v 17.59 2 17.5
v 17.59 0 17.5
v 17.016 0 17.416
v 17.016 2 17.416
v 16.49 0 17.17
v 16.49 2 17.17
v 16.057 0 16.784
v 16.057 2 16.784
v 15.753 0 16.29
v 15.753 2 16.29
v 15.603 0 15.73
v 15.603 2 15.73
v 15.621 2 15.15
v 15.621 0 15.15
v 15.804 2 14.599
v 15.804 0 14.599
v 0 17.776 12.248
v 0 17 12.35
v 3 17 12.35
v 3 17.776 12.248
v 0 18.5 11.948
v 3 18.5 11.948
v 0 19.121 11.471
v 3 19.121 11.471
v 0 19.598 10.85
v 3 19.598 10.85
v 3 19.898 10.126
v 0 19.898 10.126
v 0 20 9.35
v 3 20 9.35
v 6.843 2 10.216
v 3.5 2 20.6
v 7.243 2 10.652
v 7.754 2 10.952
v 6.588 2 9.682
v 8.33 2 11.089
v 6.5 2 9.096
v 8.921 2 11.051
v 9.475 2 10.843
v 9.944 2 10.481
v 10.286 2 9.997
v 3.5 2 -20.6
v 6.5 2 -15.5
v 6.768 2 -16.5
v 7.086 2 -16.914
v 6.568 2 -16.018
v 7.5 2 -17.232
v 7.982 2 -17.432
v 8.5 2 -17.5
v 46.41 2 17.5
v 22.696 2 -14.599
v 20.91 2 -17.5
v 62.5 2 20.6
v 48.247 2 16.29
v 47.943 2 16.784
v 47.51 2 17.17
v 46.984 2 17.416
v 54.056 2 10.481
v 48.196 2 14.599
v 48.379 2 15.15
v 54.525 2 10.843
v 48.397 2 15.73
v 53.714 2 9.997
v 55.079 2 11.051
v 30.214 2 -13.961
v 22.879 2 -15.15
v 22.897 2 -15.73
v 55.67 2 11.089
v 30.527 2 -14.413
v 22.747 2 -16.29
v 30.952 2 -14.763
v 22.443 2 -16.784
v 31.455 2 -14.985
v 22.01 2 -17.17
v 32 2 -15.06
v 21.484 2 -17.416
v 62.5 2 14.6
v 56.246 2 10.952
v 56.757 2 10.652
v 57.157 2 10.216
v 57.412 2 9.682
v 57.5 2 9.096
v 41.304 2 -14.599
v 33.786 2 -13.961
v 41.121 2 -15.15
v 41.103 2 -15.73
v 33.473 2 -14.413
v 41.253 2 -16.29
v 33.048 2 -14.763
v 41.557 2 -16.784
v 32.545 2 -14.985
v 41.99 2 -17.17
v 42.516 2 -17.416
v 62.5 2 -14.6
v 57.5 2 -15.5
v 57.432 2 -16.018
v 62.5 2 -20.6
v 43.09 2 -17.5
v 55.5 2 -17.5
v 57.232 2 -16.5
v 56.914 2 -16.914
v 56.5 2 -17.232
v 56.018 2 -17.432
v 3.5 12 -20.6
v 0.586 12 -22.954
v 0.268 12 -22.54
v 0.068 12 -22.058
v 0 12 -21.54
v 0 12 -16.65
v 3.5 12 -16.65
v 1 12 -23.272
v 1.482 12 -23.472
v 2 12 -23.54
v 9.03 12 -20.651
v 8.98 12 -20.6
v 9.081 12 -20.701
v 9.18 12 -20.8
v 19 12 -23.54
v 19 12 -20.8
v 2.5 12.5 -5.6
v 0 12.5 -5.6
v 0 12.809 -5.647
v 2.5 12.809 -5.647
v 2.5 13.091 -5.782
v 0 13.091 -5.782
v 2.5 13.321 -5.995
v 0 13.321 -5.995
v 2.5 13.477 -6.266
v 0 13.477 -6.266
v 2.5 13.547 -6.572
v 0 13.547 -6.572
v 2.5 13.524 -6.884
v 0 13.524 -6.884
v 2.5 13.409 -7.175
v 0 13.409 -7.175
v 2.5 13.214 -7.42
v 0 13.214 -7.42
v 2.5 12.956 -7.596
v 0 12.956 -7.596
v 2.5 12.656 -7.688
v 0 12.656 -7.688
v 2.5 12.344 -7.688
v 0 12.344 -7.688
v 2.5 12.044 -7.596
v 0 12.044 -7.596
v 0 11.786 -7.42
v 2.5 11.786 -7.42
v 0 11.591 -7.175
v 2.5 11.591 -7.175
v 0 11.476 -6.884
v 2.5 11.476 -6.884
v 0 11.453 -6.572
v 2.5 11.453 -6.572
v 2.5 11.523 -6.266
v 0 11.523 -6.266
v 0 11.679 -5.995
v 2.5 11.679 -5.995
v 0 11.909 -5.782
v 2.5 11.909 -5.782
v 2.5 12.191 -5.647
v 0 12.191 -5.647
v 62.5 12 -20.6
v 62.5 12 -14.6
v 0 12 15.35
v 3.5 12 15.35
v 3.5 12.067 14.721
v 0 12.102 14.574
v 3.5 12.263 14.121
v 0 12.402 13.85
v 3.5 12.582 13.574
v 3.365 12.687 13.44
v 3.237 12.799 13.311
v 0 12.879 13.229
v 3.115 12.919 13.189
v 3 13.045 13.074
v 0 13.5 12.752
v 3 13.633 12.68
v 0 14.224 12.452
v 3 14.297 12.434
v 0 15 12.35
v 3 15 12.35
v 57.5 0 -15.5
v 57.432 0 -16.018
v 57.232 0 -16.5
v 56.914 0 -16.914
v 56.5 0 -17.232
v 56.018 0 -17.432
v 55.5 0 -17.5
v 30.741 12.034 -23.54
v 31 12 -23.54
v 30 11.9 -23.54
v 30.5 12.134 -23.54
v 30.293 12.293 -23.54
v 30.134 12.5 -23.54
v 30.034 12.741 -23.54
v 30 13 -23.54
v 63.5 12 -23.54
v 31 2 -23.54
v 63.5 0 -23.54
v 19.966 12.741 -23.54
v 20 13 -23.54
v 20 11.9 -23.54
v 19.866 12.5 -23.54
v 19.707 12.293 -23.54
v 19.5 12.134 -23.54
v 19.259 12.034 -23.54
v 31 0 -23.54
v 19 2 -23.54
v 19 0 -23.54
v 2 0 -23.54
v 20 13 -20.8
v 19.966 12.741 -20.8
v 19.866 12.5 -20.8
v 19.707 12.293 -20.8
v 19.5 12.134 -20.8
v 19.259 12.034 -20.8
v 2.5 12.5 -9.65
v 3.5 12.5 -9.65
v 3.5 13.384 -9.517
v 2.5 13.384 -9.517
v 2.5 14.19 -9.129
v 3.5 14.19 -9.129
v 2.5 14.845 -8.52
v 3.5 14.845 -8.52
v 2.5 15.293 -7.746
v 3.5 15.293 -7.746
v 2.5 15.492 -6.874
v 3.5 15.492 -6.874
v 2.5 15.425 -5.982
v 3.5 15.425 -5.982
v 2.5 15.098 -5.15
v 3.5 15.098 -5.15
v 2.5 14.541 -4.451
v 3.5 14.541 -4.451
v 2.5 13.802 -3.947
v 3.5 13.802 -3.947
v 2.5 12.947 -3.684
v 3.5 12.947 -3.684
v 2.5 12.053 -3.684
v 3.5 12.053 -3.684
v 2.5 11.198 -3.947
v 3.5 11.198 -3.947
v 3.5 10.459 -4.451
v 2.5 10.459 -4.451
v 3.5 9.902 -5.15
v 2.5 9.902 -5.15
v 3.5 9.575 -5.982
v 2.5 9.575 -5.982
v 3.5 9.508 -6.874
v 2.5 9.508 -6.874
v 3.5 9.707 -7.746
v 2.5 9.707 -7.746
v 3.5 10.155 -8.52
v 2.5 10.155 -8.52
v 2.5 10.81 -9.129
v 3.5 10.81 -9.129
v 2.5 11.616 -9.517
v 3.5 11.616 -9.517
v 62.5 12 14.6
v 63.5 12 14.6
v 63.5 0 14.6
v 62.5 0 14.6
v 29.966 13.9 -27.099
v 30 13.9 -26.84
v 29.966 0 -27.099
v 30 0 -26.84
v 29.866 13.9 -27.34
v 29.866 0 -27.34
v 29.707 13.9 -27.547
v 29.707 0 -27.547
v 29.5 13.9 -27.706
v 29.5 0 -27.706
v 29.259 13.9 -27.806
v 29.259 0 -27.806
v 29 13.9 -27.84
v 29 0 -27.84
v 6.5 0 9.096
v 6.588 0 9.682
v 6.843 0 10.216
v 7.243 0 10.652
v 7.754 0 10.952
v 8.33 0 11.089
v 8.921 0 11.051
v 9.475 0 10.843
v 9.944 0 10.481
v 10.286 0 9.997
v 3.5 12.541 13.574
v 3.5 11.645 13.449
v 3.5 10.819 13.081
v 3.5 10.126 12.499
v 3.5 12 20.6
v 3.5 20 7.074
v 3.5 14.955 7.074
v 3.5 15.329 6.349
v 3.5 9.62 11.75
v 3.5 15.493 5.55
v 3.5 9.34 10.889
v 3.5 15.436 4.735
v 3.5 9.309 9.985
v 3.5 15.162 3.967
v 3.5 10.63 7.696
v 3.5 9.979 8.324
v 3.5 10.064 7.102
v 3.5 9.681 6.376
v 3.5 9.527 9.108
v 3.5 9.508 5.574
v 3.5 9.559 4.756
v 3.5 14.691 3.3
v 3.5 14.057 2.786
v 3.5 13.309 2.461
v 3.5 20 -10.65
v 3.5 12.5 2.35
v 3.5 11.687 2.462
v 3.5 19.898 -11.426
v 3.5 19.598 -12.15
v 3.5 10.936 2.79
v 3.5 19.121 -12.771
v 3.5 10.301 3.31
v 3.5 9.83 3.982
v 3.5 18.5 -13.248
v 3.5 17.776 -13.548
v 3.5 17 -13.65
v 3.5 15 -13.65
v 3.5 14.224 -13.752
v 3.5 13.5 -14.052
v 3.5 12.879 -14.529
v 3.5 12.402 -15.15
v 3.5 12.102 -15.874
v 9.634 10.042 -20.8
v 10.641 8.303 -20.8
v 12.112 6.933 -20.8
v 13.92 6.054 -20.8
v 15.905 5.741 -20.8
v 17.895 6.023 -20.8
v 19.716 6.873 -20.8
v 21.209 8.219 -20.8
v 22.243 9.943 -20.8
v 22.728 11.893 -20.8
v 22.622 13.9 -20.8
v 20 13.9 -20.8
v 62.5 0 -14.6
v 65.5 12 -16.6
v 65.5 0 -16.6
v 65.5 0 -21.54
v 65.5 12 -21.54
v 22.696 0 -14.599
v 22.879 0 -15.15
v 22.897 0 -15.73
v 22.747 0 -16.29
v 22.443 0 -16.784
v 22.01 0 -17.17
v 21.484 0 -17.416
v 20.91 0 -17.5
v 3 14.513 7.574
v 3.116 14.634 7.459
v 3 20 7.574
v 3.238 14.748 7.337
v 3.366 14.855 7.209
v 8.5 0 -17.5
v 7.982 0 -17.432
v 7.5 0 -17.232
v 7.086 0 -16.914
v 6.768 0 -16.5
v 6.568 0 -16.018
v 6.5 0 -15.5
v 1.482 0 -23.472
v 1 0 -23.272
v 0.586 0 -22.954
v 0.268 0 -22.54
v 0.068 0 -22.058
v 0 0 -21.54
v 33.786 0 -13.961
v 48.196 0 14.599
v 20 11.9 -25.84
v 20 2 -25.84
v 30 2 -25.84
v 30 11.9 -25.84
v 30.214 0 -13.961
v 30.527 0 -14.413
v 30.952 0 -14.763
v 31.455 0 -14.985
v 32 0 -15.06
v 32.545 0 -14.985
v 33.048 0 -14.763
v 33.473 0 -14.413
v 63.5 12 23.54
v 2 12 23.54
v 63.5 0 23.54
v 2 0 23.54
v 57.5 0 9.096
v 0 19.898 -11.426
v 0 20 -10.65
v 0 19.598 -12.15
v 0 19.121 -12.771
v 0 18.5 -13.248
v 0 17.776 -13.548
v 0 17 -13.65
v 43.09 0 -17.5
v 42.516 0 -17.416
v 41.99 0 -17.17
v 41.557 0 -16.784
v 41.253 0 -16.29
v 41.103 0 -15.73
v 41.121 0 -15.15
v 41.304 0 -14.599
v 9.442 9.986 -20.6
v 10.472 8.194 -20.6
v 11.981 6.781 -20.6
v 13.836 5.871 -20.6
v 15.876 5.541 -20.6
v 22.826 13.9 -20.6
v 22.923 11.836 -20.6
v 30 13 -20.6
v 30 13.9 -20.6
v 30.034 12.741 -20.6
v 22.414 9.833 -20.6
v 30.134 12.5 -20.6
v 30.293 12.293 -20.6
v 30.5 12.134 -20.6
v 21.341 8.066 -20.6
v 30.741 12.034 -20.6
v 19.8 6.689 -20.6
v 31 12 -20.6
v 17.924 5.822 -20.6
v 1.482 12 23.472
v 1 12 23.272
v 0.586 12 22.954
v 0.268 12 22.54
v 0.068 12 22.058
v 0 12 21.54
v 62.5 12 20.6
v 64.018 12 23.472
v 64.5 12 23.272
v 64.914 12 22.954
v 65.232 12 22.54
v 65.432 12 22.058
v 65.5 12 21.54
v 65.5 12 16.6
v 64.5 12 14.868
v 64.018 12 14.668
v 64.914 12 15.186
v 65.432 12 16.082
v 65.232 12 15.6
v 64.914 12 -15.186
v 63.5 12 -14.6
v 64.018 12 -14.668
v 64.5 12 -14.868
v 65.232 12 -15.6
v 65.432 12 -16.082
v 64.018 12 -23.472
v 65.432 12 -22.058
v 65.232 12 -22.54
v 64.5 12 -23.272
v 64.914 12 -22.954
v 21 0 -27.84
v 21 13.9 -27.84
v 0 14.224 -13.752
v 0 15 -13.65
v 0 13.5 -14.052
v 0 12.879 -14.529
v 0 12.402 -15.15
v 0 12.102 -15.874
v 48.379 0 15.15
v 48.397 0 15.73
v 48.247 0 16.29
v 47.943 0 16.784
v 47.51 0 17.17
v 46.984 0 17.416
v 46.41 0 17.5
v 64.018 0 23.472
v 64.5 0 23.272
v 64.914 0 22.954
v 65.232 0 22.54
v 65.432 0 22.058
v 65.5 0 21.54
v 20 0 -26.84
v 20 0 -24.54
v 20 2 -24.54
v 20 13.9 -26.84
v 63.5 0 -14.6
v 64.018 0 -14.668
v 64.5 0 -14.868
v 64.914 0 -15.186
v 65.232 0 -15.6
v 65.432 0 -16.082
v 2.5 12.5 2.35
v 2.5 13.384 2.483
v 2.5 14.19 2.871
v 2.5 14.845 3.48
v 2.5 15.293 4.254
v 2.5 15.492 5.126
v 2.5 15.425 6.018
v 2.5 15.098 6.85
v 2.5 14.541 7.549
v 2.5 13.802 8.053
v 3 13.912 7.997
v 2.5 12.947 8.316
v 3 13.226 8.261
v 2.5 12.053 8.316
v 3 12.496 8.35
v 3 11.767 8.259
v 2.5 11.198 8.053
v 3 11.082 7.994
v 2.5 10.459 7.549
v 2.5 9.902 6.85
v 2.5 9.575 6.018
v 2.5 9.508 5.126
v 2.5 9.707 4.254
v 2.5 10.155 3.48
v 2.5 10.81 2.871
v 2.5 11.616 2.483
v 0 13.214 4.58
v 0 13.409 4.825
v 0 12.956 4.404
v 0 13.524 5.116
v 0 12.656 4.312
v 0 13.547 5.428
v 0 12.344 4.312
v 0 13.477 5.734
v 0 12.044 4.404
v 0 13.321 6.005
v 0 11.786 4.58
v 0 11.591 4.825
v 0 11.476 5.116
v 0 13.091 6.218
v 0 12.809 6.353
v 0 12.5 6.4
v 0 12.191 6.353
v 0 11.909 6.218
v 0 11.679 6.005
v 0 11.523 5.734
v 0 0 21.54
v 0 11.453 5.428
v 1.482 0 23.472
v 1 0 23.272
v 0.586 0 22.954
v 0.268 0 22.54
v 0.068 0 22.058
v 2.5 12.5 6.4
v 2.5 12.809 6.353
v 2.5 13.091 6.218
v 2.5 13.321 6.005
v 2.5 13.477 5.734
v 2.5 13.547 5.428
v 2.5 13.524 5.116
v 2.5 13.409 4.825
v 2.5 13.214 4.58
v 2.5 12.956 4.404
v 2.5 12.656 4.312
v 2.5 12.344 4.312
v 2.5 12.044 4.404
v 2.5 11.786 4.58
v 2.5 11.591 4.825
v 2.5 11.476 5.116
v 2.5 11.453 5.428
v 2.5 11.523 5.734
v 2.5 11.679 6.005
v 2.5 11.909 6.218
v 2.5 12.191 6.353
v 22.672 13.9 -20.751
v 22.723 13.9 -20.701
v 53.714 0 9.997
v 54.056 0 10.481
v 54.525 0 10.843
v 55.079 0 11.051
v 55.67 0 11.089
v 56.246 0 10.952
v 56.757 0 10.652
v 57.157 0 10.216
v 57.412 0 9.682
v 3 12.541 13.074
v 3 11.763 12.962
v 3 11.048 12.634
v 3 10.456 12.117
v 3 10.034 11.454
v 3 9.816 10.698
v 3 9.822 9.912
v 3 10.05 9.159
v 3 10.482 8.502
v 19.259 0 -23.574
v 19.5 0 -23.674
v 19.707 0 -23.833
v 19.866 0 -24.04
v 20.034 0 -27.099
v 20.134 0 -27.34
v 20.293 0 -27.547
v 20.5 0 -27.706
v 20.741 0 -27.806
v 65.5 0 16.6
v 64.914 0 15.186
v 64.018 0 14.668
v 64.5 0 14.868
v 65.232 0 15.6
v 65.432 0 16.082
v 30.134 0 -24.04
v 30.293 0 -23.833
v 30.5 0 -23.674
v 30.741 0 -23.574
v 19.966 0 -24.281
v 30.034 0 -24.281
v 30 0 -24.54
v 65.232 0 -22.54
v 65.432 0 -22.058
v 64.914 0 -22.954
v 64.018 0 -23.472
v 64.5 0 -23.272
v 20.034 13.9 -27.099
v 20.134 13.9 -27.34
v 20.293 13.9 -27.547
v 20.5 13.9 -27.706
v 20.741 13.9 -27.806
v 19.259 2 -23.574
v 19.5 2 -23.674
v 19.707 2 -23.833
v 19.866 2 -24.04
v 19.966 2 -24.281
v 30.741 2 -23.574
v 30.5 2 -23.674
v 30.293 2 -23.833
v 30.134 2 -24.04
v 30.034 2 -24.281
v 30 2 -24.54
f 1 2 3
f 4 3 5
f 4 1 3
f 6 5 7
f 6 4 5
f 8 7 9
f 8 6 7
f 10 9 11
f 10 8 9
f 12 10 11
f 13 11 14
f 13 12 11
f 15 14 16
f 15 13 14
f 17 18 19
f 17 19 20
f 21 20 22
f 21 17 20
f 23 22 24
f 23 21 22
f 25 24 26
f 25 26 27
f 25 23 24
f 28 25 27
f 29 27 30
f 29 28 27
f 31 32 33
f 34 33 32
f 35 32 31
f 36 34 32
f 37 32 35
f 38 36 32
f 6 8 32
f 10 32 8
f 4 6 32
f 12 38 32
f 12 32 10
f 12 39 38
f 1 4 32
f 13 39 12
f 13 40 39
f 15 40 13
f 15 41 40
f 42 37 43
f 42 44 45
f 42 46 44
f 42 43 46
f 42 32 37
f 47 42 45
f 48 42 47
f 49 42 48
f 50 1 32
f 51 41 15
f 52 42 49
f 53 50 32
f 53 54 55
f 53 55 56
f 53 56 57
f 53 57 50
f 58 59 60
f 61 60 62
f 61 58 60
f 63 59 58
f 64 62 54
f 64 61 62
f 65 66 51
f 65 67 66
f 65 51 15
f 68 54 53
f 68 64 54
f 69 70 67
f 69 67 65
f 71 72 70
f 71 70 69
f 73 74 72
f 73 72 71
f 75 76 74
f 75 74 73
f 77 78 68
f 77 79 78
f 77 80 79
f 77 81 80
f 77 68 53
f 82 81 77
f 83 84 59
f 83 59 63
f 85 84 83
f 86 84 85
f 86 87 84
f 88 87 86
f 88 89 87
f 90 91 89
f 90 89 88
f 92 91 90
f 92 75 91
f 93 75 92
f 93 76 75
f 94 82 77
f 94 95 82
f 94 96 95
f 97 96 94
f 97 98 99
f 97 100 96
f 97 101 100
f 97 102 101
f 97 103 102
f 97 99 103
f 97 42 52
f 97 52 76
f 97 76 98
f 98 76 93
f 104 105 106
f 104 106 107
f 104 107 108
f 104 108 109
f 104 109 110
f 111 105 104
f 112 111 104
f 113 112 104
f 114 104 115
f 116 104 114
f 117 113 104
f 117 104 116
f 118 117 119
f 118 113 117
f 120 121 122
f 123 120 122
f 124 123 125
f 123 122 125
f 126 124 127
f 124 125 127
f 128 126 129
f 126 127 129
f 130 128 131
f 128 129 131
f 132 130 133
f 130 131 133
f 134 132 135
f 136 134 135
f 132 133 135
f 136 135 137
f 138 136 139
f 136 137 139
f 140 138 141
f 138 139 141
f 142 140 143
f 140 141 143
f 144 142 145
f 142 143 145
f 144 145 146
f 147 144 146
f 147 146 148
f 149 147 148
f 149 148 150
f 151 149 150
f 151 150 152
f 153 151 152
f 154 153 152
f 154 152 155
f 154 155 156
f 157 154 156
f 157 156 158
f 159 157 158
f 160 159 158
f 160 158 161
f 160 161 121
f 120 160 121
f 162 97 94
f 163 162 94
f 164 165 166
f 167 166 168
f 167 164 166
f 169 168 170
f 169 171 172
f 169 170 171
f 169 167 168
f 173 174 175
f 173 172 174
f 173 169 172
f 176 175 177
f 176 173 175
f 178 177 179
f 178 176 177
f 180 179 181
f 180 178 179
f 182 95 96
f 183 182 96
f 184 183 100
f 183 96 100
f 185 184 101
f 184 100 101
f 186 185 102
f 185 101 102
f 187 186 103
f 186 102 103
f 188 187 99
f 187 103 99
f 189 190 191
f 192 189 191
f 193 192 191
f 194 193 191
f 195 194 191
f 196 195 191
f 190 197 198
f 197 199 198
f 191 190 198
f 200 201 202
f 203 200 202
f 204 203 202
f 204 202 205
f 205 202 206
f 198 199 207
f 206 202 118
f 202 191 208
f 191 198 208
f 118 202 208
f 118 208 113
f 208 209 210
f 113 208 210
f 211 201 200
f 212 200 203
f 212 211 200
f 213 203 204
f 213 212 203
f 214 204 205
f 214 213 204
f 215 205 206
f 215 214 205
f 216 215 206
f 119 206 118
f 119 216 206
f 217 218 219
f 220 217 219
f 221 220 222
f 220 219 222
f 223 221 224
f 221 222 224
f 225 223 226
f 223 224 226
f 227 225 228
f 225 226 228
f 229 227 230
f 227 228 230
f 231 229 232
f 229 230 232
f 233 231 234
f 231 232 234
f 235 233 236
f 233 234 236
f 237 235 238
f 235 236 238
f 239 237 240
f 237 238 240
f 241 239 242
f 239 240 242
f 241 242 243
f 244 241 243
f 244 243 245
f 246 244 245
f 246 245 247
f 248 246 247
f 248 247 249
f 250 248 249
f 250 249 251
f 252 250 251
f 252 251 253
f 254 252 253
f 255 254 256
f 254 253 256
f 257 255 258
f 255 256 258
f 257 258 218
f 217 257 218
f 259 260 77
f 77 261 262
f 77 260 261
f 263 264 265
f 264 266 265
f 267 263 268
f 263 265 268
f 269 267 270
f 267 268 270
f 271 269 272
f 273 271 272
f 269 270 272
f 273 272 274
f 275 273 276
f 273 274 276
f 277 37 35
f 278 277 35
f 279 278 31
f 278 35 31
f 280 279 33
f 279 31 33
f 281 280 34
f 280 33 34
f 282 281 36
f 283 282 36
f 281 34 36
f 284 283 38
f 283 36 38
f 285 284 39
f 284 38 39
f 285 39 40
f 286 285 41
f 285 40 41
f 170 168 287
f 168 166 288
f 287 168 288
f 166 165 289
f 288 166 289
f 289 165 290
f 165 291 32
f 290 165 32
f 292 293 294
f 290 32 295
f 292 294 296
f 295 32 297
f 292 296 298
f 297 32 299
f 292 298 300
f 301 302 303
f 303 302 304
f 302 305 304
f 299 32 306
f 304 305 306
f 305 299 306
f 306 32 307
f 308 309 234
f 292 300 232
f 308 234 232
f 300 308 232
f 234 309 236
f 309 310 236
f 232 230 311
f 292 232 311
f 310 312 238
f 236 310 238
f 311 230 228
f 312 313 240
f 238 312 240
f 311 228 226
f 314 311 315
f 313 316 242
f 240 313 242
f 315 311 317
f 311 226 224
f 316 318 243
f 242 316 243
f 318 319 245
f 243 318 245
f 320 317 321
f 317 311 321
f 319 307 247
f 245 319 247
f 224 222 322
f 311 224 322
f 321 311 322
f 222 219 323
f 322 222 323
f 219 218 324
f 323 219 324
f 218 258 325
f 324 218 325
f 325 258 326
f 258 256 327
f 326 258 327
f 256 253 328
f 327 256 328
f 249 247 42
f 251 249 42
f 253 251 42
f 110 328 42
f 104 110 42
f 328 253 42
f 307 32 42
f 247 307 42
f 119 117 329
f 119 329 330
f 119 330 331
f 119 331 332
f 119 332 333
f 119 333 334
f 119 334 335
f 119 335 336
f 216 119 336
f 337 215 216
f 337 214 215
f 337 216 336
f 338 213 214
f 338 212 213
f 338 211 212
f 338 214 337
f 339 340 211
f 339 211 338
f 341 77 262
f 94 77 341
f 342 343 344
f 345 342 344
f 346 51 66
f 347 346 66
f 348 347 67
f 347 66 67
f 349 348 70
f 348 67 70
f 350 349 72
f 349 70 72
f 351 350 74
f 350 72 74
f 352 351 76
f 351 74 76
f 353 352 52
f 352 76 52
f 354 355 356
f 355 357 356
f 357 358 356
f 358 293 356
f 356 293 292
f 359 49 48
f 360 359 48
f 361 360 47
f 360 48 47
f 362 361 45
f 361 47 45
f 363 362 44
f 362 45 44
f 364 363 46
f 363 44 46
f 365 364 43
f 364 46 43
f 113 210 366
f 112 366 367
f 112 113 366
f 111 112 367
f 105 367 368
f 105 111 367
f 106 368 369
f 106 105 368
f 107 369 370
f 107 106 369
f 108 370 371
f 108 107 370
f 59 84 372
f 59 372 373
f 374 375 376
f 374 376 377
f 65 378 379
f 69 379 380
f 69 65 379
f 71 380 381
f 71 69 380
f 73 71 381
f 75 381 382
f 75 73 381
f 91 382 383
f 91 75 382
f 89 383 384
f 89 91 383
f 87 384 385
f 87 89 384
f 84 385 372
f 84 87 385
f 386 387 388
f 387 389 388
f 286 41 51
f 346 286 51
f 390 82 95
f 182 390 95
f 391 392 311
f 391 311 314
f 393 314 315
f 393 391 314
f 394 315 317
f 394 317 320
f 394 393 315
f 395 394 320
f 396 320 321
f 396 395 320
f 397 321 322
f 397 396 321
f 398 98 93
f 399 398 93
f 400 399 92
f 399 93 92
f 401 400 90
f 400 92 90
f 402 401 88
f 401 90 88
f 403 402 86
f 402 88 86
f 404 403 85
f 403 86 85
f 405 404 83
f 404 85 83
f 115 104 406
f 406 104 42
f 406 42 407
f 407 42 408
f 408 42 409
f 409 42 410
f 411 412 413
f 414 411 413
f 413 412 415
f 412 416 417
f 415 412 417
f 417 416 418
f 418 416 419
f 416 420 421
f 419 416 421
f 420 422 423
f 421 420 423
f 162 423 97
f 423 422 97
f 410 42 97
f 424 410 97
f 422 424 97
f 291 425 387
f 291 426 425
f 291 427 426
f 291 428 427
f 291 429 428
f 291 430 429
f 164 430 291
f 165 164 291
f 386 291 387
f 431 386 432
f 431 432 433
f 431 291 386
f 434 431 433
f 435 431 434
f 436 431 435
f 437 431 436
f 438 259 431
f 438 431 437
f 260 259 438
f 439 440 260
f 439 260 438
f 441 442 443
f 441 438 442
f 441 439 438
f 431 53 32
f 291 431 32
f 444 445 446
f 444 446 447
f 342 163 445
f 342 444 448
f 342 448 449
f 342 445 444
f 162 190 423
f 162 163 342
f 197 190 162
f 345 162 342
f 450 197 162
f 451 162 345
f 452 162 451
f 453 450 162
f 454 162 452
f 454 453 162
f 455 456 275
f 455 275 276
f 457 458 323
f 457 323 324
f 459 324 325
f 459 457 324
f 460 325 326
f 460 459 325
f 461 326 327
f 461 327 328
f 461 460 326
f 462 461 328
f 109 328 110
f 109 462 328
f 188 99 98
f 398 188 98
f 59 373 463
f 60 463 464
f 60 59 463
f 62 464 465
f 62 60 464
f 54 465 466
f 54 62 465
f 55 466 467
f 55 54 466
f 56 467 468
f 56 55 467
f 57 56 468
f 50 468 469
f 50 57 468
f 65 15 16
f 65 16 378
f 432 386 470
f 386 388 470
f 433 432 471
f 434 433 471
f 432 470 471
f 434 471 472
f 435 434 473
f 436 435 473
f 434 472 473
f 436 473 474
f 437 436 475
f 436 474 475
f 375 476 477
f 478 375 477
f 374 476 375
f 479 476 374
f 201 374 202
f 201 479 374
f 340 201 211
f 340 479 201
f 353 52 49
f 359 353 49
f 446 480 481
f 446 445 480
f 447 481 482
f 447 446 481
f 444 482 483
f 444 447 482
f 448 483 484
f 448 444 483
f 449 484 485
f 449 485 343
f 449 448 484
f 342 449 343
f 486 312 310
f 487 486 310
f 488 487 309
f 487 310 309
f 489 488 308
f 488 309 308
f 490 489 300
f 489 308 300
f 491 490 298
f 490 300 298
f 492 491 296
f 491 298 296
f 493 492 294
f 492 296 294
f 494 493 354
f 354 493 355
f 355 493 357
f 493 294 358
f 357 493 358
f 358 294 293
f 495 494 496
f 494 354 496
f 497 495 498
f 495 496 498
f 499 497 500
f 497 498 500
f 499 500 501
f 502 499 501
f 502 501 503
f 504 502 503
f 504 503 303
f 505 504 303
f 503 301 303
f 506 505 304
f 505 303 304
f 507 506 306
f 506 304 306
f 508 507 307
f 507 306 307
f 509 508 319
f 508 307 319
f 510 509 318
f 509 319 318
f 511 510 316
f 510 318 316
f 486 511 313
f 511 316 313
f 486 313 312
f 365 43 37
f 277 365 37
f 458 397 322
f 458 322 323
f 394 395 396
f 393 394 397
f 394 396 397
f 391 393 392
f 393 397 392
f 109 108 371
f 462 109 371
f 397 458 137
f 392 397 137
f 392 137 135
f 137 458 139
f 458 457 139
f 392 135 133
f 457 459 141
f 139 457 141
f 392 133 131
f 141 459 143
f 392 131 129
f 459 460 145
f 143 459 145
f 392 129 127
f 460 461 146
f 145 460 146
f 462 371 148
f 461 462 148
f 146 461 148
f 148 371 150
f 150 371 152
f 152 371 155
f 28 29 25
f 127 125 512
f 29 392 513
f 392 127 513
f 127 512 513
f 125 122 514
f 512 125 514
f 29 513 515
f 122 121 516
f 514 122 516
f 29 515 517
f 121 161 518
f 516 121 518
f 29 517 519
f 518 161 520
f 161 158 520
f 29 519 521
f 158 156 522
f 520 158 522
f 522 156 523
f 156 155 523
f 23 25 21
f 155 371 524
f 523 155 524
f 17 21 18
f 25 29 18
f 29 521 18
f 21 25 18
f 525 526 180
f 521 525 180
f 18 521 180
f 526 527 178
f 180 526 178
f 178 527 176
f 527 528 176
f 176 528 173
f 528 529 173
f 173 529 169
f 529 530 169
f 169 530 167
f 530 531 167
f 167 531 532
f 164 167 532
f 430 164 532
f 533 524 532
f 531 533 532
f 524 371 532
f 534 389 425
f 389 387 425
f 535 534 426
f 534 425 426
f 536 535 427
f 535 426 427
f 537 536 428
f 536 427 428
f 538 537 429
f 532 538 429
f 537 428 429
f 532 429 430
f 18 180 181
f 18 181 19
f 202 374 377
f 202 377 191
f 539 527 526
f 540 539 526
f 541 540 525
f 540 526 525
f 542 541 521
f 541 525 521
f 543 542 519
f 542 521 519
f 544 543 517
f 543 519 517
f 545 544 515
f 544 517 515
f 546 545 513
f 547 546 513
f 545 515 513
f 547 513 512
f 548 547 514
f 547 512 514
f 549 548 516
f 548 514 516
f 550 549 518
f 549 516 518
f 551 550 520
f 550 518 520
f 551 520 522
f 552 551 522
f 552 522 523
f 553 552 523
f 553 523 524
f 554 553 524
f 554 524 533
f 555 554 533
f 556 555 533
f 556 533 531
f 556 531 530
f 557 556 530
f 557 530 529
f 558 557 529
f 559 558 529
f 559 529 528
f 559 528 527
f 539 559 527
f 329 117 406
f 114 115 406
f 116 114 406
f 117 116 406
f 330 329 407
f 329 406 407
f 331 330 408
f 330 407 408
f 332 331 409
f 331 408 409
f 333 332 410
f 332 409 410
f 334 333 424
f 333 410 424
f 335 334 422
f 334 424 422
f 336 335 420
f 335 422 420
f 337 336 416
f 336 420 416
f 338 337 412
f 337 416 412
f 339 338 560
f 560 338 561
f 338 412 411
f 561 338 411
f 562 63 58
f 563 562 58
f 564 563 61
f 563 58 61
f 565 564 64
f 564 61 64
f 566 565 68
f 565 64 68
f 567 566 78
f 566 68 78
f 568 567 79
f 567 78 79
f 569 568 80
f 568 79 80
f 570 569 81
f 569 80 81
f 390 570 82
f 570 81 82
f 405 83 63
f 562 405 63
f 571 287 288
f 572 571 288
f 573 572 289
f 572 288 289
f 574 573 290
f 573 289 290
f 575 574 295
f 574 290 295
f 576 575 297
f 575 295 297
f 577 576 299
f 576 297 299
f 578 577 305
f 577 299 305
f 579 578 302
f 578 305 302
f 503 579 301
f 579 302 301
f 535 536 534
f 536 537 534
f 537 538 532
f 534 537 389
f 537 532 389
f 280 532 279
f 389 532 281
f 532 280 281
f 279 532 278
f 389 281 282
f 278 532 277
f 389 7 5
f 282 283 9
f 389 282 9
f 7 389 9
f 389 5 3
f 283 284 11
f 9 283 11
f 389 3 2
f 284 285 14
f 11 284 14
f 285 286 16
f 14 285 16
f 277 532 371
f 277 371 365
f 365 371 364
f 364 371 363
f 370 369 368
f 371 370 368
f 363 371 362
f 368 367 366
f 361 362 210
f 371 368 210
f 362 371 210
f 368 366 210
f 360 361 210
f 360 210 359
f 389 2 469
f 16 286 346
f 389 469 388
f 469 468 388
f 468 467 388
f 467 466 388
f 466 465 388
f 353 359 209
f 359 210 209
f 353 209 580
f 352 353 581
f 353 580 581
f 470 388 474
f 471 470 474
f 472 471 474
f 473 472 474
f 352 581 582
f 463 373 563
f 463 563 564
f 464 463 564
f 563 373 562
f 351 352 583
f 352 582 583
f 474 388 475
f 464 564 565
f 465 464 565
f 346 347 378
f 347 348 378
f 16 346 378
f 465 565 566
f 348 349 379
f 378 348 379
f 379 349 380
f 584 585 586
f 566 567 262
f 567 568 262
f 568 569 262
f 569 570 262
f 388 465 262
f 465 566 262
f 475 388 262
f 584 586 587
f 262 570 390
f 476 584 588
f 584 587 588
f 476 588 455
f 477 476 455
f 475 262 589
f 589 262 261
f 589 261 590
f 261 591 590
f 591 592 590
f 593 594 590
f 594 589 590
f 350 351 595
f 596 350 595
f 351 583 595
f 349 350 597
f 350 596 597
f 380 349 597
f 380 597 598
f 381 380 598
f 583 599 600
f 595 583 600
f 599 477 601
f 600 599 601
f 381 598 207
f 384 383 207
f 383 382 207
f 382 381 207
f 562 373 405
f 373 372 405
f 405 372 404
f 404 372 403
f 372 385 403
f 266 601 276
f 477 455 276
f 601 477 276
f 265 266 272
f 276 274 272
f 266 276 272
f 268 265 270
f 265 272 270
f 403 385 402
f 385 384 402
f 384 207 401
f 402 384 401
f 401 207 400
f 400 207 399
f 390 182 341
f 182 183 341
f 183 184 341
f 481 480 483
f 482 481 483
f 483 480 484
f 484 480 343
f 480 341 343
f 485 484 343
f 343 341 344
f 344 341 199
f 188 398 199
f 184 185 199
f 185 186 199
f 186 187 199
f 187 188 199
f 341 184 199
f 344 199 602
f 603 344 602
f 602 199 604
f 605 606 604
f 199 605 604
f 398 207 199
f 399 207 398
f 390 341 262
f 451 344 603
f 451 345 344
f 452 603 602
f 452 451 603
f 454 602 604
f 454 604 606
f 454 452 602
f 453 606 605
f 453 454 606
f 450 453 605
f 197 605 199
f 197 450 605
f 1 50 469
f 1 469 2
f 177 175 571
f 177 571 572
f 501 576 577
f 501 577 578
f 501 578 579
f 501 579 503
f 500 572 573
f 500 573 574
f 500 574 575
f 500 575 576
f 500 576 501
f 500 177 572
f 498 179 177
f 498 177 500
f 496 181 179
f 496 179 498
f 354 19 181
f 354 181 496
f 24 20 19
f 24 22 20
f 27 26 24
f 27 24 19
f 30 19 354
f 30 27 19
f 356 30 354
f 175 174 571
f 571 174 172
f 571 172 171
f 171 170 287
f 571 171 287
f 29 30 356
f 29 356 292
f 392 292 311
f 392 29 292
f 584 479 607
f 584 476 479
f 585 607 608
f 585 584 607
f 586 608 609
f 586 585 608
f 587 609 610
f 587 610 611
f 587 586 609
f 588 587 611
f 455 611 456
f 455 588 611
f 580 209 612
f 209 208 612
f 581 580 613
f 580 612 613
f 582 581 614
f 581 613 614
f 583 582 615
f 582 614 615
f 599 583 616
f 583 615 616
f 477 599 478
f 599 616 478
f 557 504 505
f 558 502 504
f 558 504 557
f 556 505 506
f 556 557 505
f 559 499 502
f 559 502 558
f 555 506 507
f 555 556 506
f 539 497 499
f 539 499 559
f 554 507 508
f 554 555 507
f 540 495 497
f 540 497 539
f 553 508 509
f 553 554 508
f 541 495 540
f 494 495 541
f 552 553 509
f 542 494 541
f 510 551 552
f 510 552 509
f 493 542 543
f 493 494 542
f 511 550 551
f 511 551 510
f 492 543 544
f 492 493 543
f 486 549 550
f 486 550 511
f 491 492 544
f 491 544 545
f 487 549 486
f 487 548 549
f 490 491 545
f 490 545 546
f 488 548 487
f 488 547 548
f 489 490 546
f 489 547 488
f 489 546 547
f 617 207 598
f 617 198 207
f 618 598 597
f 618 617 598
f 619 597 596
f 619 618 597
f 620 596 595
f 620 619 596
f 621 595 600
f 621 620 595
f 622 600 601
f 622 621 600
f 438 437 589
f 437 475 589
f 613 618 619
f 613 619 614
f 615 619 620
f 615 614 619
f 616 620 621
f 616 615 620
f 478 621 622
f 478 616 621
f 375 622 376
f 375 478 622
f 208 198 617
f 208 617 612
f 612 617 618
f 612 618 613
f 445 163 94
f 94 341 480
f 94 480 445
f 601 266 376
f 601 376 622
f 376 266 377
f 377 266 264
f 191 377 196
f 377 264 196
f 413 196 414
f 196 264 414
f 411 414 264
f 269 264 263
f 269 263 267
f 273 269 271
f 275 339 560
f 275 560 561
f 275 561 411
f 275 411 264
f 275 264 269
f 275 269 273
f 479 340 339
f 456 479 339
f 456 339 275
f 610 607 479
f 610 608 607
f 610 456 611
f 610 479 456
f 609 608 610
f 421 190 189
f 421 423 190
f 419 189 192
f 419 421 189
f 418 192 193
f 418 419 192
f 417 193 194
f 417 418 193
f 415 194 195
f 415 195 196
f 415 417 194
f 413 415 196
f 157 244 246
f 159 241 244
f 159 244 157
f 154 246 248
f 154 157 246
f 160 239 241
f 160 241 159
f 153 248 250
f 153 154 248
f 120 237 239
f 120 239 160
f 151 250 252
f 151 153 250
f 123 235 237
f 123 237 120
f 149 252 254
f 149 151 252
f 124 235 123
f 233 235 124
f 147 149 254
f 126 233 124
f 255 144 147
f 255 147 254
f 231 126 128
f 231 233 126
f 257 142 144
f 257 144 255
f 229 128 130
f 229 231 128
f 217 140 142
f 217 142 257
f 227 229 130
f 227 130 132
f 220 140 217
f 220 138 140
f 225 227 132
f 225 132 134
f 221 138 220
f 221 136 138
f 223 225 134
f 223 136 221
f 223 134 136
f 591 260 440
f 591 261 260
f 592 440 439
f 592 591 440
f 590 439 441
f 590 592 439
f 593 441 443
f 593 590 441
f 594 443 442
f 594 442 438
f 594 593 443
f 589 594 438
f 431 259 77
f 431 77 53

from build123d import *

# Parameters (mm, degrees)
SKETCH1_W           = 65.5
SKETCH1_H           = 47.08
BOSS_EXTRUDE1_DEPTH = 2
BOSS_EXTRUDE2_DEPTH = 10
BOSS_EXTRUDE3_DEPTH = 3.5
SKETCH4_R           = 1.05
CUT_EXTRUDE1_DEPTH  = 73.418102709
CUT_EXTRUDE3_DEPTH  = 72.891457072
CUT_EXTRUDE8_DEPTH  = 0.5
CUT_EXTRUDE8_DRAFT  = -45
SKETCH25_W          = 3
SKETCH25_H          = 29.2
CUT_EXTRUDE10_DEPTH = 72.891457072
FILLET1_R           = 2
BOSS_EXTRUDE4_DEPTH = 10
FILLET2_R           = 1
SKETCH27_R          = 3
CUT_EXTRUDE11_DEPTH = 1
FILLET4_R           = 1
SKETCH24_R          = 7
CUT_EXTRUDE9_DEPTH  = 0.2
CUT_EXTRUDE9_DRAFT  = -45


with BuildPart() as part:
    # Sketch1 → Boss-Extrude1 (new body)
    with BuildSketch(Plane(origin=(0, 0, 0), x_dir=(1, 0, 0), z_dir=(0, 1, 0))):
        with Locations((32.75, 0)):
            Rectangle(SKETCH1_W, SKETCH1_H)
    extrude(amount=BOSS_EXTRUDE1_DEPTH)

    # Sketch2 → Boss-Extrude2 (add)
    with BuildSketch(Plane(origin=(0, 2, 0), x_dir=(1, 0, 0), z_dir=(0, 1, 0))):
        Polygon((3.5, 20.6), (62.5, 20.6), (62.5, 14.6), (65.5, 14.6), (65.5, 23.54), (0, 23.54), (0, -23.54), (65.5, -23.54), (65.5, -14.6), (62.5, -14.6), (62.5, -20.6), (3.5, -20.6), align=None)
    extrude(amount=BOSS_EXTRUDE2_DEPTH)

    # Sketch3 → Boss-Extrude3 (add)
    with BuildSketch(Plane.ZY):
        with BuildLine():
            Line((-16.65, 12), (-0.65, 12))
            Line((-0.65, 12), (-0.65, 20))
            Line((-0.65, 20), (-10.65, 20))
            ThreePointArc((-10.65, 20), (-12.771320344, 19.121320344), (-13.65, 17))
            Line((-13.65, 17), (-13.65, 15))
            ThreePointArc((-13.65, 15), (-14.528679656, 12.878679656), (-16.65, 12))
        make_face()
        with BuildLine():
            Line((-0.65, 20), (-0.65, 12))
            Line((-0.65, 12), (15.35, 12))
            ThreePointArc((15.35, 12), (13.228679656, 12.878679656), (12.35, 15))
            Line((12.35, 15), (12.35, 17))
            ThreePointArc((12.35, 17), (11.471320344, 19.121320344), (9.35, 20))
            Line((9.35, 20), (-0.65, 20))
        make_face()
    extrude(amount=-BOSS_EXTRUDE3_DEPTH)

    # Sketch4 → Cut-Extrude1 (cut, through all)
    with BuildSketch(Plane.ZY):
        with Locations((-6.65, 12.5)):
            Circle(SKETCH4_R)
        with Locations((5.35, 12.5)):
            Circle(SKETCH4_R)
    extrude(amount=-CUT_EXTRUDE1_DEPTH, mode=Mode.SUBTRACT)

    # Sketch6 → Cut-Extrude3 (cut, through all)
    with BuildSketch(Plane(origin=(0, 2, 0), x_dir=(1, 0, 0), z_dir=(0, 1, 0))):
        with BuildLine():
            Line((6.5, 15.5), (6.5, -9.096254447))
            ThreePointArc((6.5, -9.096254447), (8.036954343, -11.041913389), (10.285588719, -9.997183371))
            Line((10.285588719, -9.997183371), (22.695768518, 14.599071076))
            ThreePointArc((22.695768518, 14.599071076), (22.613391155, 16.548365908), (20.910179799, 17.5))
            Line((20.910179799, 17.5), (8.5, 17.5))
            ThreePointArc((8.5, 17.5), (7.085786438, 16.914213562), (6.5, 15.5))
        make_face()
        with BuildLine():
            Line((15.804231482, -14.599071076), (30.214411281, 13.961067028))
            ThreePointArc((30.214411281, 13.961067028), (32, 15.060138105), (33.785588719, 13.961067028))
            Line((33.785588719, 13.961067028), (48.195768518, -14.599071076))
            ThreePointArc((48.195768518, -14.599071076), (48.113391155, -16.548365908), (46.410179799, -17.5))
            Line((46.410179799, -17.5), (17.589820201, -17.5))
            ThreePointArc((17.589820201, -17.5), (15.886608845, -16.548365908), (15.804231482, -14.599071076))
        make_face()
        with BuildLine():
            Line((57.5, -9.096254447), (57.5, 15.5))
            ThreePointArc((57.5, 15.5), (56.914213562, 16.914213562), (55.5, 17.5))
            Line((55.5, 17.5), (43.089820201, 17.5))
            ThreePointArc((43.089820201, 17.5), (41.386608845, 16.548365908), (41.304231482, 14.599071076))
            Line((41.304231482, 14.599071076), (53.714411281, -9.997183371))
            ThreePointArc((53.714411281, -9.997183371), (55.963045657, -11.041913389), (57.5, -9.096254447))
        make_face()
    extrude(amount=-CUT_EXTRUDE3_DEPTH, mode=Mode.SUBTRACT)


with BuildPart() as cut_extrude8_tool:
    # Sketch23 → Cut-Extrude8 (with draft: the straight prism first)
    with BuildSketch(Plane(origin=(3.5, 0, 0), x_dir=(0, 0, -1), z_dir=(1, 0, 0))):
        with BuildLine():
            ThreePointArc((-13.5745, 12.541), (-10.3245, 9.291), (-7.0745, 12.541))
            Line((-7.0745, 12.541), (-7.0745, 22.997537045))
            Line((-7.0745, 22.997537045), (-13.5745, 22.997537045))
            Line((-13.5745, 22.997537045), (-13.5745, 12.541))
        make_face()
    extrude(amount=-CUT_EXTRUDE8_DEPTH)
    # Cut-Extrude8: the draft: its side faces are tilted about the plane it starts from
    cut_extrude8_sides = [cut_extrude8_tool.faces().sort_by_distance(p)[0] for p in [
        (3.25, 17.769268522, 7.0745),
        (3.25, 22.997537045, 10.3245),
        (3.25, 17.769268522, 13.5745),
        (3.25, 9.291, 10.3245),
    ]]
    draft(cut_extrude8_sides, Plane(origin=(3.5, 0, 0), x_dir=(0, 0, -1), z_dir=(1, 0, 0)), CUT_EXTRUDE8_DRAFT)


with BuildPart() as part_1:
    add(part.part)

    # Cut-Extrude8: cut by cut_extrude8_tool
    add(cut_extrude8_tool.part, mode=Mode.SUBTRACT)

    # Sketch25 → Cut-Extrude10 (cut, through all)
    with BuildSketch(Plane(origin=(0, 2, 0), x_dir=(1, 0, 0), z_dir=(0, 1, 0))):
        with Locations((64, 0)):
            Rectangle(SKETCH25_W, SKETCH25_H)
    extrude(amount=-CUT_EXTRUDE10_DEPTH, mode=Mode.SUBTRACT)

    # Fillet1
    fillet1_edges = [part_1.edges().sort_by_distance(p)[0] for p in [
        (65.5, 6, 14.6),
        (65.5, 6, -14.6),
        (65.5, 6, -23.54),
        (65.5, 6, 23.54),
        (0, 6, 23.54),
        (0, 6, -23.54),
    ]]
    fillet(fillet1_edges, radius=FILLET1_R)

    # Sketch26 → Boss-Extrude4 (add)
    with BuildSketch(Plane.ZY.offset(-20)):
        Polygon((-27.84, 0), (-23.54, 0), (-23.54, 2), (-25.84, 2), (-25.84, 11.9), (-23.54, 11.9), (-23.54, 12), (-20.6, 12), (-20.6, 13.9), (-27.84, 13.9), (-27.84, 12), align=None)
    extrude(amount=-BOSS_EXTRUDE4_DEPTH)

    # Fillet2
    fillet2_edges = [part_1.edges().sort_by_distance(p)[0] for p in [
        (20, 6.95, -27.84),
        (30, 1, -23.54),
        (30, 6.95, -27.84),
        (20, 1, -23.54),
    ]]
    fillet(fillet2_edges, radius=FILLET2_R)

    # Sketch27 → Cut-Extrude11 (cut)
    with BuildSketch(Plane(origin=(3.5, 0, 0), x_dir=(0, 0, -1), z_dir=(1, 0, 0))):
        with Locations((-5.35, 12.5)):
            Circle(SKETCH27_R)
        with Locations((6.65, 12.5)):
            Circle(SKETCH27_R)
    extrude(amount=-CUT_EXTRUDE11_DEPTH, mode=Mode.SUBTRACT)

    # Fillet4
    fillet4_edges = [part_1.edges().sort_by_distance(p)[0] for p in [
        (20, 12, -22.07),
        (30, 12, -22.07),
    ]]
    fillet(fillet4_edges, radius=FILLET4_R)


with BuildPart() as cut_extrude9_tool:
    # Sketch24 → Cut-Extrude9 (with draft: the straight prism first)
    with BuildSketch(Plane.XY.offset(-20.6)):
        with Locations((15.9587, 12.541)):
            Circle(SKETCH24_R)
    extrude(amount=-CUT_EXTRUDE9_DEPTH)
    # Cut-Extrude9: the draft: its side faces are tilted about the plane it starts from
    cut_extrude9_sides = [cut_extrude9_tool.faces().sort_by_distance(p)[0] for p in [
        (8.9587, 12.541, -20.7),
    ]]
    draft(cut_extrude9_sides, Plane.XY.offset(-20.6), CUT_EXTRUDE9_DRAFT)


with BuildPart() as part_2:
    add(part_1.part)

    # Cut-Extrude9: cut by cut_extrude9_tool
    add(cut_extrude9_tool.part, mode=Mode.SUBTRACT)


solid = part_2.part
